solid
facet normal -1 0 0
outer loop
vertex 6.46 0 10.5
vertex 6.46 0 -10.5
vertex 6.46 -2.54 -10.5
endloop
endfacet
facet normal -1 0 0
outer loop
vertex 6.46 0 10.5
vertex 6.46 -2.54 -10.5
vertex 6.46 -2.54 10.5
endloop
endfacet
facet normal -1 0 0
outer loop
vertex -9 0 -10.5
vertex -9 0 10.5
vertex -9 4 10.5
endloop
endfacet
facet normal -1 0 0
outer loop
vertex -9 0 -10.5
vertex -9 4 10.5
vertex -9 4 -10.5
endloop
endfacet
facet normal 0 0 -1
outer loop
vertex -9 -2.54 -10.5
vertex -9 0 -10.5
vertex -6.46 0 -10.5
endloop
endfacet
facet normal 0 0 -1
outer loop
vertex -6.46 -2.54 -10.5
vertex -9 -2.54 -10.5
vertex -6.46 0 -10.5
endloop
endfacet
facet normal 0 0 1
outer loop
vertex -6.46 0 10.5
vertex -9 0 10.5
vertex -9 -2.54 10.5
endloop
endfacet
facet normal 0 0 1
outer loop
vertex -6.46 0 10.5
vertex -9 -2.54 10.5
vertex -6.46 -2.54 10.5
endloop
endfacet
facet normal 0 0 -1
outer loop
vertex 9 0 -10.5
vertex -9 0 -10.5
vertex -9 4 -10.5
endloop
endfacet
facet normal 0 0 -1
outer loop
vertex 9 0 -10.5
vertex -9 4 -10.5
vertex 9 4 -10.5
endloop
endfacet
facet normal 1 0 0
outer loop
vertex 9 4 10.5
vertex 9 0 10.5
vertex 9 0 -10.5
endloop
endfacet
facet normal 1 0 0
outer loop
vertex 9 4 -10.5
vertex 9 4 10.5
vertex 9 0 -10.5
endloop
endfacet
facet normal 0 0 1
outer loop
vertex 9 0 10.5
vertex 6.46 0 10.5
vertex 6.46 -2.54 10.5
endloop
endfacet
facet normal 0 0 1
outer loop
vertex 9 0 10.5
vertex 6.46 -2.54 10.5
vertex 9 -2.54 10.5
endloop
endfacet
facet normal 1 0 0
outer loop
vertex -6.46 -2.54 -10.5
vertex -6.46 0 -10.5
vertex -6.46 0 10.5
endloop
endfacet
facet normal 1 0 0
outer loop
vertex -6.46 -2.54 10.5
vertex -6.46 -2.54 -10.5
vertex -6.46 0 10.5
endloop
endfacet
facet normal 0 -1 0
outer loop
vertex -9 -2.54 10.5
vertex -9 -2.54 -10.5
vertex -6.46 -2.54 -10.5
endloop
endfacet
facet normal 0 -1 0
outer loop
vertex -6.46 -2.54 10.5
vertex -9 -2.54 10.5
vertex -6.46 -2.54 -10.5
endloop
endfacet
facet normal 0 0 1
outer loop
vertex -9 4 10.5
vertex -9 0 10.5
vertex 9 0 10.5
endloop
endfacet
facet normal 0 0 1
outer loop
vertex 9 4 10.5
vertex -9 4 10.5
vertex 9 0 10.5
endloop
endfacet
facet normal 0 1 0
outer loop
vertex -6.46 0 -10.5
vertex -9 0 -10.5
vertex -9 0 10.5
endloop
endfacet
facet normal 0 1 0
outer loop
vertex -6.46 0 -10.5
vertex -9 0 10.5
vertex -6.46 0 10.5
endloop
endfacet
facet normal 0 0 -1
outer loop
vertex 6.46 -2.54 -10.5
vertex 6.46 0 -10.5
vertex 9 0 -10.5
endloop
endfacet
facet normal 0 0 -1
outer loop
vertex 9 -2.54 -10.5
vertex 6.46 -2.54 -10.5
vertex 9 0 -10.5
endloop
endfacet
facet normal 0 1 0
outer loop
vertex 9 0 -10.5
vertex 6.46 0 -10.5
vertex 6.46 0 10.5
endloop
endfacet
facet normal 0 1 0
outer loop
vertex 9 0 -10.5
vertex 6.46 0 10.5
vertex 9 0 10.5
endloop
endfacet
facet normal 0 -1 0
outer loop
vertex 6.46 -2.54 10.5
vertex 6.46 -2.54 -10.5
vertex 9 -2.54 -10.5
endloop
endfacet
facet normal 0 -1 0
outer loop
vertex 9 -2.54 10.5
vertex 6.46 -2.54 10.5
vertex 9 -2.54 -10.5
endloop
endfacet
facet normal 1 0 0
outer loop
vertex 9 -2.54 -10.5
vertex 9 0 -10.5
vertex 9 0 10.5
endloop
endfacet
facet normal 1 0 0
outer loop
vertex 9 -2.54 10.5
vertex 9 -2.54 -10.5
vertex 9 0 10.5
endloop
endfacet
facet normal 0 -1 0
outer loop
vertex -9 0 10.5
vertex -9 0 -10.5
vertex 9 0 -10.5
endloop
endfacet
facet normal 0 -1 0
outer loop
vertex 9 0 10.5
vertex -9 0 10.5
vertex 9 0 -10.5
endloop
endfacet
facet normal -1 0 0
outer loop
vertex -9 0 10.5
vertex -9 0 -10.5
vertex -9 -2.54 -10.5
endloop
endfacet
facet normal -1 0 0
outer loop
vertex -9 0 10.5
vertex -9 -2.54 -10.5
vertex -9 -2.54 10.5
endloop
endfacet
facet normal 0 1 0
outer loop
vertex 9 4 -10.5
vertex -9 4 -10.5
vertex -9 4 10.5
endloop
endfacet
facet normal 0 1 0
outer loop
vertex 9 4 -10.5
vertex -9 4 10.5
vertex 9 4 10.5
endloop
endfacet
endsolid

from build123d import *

# Parameters (mm, degrees)
SKETCH_1_W        = 18
SKETCH_1_H        = 21
EXTRUDE_1_DEPTH   = 4
SKETCH_2_W        = 2.54
SKETCH_2_H        = 21
EXTRUDE_2_DEPTH   = 2.54
EXTRUDE_2_2_DEPTH = 2.54


with BuildPart() as part:
    # Эскиз1 → Бобышка-Вытянуть1 (new body)
    with BuildSketch(Plane(origin=(0, 0, 0), x_dir=(1, 0, 0), z_dir=(0, 1, 0))):
        Rectangle(SKETCH_1_W, SKETCH_1_H)
    extrude(amount=EXTRUDE_1_DEPTH)


with BuildPart() as body_2:
    # Эскиз2 → Бобышка-Вытянуть2 (new body)
    with BuildSketch(Plane.XZ):
        with Locations((7.73, 0)):
            Rectangle(SKETCH_2_W, SKETCH_2_H)
    extrude(amount=EXTRUDE_2_DEPTH)


with BuildPart() as body_3:
    # Эскиз2 → Extrude 2 2 (new body)
    with BuildSketch(Plane.XZ):
        with Locations((-7.73, 0)):
            Rectangle(SKETCH_2_W, SKETCH_2_H)
    extrude(amount=EXTRUDE_2_2_DEPTH)


solid = Compound([part.part, body_2.part, body_3.part])
